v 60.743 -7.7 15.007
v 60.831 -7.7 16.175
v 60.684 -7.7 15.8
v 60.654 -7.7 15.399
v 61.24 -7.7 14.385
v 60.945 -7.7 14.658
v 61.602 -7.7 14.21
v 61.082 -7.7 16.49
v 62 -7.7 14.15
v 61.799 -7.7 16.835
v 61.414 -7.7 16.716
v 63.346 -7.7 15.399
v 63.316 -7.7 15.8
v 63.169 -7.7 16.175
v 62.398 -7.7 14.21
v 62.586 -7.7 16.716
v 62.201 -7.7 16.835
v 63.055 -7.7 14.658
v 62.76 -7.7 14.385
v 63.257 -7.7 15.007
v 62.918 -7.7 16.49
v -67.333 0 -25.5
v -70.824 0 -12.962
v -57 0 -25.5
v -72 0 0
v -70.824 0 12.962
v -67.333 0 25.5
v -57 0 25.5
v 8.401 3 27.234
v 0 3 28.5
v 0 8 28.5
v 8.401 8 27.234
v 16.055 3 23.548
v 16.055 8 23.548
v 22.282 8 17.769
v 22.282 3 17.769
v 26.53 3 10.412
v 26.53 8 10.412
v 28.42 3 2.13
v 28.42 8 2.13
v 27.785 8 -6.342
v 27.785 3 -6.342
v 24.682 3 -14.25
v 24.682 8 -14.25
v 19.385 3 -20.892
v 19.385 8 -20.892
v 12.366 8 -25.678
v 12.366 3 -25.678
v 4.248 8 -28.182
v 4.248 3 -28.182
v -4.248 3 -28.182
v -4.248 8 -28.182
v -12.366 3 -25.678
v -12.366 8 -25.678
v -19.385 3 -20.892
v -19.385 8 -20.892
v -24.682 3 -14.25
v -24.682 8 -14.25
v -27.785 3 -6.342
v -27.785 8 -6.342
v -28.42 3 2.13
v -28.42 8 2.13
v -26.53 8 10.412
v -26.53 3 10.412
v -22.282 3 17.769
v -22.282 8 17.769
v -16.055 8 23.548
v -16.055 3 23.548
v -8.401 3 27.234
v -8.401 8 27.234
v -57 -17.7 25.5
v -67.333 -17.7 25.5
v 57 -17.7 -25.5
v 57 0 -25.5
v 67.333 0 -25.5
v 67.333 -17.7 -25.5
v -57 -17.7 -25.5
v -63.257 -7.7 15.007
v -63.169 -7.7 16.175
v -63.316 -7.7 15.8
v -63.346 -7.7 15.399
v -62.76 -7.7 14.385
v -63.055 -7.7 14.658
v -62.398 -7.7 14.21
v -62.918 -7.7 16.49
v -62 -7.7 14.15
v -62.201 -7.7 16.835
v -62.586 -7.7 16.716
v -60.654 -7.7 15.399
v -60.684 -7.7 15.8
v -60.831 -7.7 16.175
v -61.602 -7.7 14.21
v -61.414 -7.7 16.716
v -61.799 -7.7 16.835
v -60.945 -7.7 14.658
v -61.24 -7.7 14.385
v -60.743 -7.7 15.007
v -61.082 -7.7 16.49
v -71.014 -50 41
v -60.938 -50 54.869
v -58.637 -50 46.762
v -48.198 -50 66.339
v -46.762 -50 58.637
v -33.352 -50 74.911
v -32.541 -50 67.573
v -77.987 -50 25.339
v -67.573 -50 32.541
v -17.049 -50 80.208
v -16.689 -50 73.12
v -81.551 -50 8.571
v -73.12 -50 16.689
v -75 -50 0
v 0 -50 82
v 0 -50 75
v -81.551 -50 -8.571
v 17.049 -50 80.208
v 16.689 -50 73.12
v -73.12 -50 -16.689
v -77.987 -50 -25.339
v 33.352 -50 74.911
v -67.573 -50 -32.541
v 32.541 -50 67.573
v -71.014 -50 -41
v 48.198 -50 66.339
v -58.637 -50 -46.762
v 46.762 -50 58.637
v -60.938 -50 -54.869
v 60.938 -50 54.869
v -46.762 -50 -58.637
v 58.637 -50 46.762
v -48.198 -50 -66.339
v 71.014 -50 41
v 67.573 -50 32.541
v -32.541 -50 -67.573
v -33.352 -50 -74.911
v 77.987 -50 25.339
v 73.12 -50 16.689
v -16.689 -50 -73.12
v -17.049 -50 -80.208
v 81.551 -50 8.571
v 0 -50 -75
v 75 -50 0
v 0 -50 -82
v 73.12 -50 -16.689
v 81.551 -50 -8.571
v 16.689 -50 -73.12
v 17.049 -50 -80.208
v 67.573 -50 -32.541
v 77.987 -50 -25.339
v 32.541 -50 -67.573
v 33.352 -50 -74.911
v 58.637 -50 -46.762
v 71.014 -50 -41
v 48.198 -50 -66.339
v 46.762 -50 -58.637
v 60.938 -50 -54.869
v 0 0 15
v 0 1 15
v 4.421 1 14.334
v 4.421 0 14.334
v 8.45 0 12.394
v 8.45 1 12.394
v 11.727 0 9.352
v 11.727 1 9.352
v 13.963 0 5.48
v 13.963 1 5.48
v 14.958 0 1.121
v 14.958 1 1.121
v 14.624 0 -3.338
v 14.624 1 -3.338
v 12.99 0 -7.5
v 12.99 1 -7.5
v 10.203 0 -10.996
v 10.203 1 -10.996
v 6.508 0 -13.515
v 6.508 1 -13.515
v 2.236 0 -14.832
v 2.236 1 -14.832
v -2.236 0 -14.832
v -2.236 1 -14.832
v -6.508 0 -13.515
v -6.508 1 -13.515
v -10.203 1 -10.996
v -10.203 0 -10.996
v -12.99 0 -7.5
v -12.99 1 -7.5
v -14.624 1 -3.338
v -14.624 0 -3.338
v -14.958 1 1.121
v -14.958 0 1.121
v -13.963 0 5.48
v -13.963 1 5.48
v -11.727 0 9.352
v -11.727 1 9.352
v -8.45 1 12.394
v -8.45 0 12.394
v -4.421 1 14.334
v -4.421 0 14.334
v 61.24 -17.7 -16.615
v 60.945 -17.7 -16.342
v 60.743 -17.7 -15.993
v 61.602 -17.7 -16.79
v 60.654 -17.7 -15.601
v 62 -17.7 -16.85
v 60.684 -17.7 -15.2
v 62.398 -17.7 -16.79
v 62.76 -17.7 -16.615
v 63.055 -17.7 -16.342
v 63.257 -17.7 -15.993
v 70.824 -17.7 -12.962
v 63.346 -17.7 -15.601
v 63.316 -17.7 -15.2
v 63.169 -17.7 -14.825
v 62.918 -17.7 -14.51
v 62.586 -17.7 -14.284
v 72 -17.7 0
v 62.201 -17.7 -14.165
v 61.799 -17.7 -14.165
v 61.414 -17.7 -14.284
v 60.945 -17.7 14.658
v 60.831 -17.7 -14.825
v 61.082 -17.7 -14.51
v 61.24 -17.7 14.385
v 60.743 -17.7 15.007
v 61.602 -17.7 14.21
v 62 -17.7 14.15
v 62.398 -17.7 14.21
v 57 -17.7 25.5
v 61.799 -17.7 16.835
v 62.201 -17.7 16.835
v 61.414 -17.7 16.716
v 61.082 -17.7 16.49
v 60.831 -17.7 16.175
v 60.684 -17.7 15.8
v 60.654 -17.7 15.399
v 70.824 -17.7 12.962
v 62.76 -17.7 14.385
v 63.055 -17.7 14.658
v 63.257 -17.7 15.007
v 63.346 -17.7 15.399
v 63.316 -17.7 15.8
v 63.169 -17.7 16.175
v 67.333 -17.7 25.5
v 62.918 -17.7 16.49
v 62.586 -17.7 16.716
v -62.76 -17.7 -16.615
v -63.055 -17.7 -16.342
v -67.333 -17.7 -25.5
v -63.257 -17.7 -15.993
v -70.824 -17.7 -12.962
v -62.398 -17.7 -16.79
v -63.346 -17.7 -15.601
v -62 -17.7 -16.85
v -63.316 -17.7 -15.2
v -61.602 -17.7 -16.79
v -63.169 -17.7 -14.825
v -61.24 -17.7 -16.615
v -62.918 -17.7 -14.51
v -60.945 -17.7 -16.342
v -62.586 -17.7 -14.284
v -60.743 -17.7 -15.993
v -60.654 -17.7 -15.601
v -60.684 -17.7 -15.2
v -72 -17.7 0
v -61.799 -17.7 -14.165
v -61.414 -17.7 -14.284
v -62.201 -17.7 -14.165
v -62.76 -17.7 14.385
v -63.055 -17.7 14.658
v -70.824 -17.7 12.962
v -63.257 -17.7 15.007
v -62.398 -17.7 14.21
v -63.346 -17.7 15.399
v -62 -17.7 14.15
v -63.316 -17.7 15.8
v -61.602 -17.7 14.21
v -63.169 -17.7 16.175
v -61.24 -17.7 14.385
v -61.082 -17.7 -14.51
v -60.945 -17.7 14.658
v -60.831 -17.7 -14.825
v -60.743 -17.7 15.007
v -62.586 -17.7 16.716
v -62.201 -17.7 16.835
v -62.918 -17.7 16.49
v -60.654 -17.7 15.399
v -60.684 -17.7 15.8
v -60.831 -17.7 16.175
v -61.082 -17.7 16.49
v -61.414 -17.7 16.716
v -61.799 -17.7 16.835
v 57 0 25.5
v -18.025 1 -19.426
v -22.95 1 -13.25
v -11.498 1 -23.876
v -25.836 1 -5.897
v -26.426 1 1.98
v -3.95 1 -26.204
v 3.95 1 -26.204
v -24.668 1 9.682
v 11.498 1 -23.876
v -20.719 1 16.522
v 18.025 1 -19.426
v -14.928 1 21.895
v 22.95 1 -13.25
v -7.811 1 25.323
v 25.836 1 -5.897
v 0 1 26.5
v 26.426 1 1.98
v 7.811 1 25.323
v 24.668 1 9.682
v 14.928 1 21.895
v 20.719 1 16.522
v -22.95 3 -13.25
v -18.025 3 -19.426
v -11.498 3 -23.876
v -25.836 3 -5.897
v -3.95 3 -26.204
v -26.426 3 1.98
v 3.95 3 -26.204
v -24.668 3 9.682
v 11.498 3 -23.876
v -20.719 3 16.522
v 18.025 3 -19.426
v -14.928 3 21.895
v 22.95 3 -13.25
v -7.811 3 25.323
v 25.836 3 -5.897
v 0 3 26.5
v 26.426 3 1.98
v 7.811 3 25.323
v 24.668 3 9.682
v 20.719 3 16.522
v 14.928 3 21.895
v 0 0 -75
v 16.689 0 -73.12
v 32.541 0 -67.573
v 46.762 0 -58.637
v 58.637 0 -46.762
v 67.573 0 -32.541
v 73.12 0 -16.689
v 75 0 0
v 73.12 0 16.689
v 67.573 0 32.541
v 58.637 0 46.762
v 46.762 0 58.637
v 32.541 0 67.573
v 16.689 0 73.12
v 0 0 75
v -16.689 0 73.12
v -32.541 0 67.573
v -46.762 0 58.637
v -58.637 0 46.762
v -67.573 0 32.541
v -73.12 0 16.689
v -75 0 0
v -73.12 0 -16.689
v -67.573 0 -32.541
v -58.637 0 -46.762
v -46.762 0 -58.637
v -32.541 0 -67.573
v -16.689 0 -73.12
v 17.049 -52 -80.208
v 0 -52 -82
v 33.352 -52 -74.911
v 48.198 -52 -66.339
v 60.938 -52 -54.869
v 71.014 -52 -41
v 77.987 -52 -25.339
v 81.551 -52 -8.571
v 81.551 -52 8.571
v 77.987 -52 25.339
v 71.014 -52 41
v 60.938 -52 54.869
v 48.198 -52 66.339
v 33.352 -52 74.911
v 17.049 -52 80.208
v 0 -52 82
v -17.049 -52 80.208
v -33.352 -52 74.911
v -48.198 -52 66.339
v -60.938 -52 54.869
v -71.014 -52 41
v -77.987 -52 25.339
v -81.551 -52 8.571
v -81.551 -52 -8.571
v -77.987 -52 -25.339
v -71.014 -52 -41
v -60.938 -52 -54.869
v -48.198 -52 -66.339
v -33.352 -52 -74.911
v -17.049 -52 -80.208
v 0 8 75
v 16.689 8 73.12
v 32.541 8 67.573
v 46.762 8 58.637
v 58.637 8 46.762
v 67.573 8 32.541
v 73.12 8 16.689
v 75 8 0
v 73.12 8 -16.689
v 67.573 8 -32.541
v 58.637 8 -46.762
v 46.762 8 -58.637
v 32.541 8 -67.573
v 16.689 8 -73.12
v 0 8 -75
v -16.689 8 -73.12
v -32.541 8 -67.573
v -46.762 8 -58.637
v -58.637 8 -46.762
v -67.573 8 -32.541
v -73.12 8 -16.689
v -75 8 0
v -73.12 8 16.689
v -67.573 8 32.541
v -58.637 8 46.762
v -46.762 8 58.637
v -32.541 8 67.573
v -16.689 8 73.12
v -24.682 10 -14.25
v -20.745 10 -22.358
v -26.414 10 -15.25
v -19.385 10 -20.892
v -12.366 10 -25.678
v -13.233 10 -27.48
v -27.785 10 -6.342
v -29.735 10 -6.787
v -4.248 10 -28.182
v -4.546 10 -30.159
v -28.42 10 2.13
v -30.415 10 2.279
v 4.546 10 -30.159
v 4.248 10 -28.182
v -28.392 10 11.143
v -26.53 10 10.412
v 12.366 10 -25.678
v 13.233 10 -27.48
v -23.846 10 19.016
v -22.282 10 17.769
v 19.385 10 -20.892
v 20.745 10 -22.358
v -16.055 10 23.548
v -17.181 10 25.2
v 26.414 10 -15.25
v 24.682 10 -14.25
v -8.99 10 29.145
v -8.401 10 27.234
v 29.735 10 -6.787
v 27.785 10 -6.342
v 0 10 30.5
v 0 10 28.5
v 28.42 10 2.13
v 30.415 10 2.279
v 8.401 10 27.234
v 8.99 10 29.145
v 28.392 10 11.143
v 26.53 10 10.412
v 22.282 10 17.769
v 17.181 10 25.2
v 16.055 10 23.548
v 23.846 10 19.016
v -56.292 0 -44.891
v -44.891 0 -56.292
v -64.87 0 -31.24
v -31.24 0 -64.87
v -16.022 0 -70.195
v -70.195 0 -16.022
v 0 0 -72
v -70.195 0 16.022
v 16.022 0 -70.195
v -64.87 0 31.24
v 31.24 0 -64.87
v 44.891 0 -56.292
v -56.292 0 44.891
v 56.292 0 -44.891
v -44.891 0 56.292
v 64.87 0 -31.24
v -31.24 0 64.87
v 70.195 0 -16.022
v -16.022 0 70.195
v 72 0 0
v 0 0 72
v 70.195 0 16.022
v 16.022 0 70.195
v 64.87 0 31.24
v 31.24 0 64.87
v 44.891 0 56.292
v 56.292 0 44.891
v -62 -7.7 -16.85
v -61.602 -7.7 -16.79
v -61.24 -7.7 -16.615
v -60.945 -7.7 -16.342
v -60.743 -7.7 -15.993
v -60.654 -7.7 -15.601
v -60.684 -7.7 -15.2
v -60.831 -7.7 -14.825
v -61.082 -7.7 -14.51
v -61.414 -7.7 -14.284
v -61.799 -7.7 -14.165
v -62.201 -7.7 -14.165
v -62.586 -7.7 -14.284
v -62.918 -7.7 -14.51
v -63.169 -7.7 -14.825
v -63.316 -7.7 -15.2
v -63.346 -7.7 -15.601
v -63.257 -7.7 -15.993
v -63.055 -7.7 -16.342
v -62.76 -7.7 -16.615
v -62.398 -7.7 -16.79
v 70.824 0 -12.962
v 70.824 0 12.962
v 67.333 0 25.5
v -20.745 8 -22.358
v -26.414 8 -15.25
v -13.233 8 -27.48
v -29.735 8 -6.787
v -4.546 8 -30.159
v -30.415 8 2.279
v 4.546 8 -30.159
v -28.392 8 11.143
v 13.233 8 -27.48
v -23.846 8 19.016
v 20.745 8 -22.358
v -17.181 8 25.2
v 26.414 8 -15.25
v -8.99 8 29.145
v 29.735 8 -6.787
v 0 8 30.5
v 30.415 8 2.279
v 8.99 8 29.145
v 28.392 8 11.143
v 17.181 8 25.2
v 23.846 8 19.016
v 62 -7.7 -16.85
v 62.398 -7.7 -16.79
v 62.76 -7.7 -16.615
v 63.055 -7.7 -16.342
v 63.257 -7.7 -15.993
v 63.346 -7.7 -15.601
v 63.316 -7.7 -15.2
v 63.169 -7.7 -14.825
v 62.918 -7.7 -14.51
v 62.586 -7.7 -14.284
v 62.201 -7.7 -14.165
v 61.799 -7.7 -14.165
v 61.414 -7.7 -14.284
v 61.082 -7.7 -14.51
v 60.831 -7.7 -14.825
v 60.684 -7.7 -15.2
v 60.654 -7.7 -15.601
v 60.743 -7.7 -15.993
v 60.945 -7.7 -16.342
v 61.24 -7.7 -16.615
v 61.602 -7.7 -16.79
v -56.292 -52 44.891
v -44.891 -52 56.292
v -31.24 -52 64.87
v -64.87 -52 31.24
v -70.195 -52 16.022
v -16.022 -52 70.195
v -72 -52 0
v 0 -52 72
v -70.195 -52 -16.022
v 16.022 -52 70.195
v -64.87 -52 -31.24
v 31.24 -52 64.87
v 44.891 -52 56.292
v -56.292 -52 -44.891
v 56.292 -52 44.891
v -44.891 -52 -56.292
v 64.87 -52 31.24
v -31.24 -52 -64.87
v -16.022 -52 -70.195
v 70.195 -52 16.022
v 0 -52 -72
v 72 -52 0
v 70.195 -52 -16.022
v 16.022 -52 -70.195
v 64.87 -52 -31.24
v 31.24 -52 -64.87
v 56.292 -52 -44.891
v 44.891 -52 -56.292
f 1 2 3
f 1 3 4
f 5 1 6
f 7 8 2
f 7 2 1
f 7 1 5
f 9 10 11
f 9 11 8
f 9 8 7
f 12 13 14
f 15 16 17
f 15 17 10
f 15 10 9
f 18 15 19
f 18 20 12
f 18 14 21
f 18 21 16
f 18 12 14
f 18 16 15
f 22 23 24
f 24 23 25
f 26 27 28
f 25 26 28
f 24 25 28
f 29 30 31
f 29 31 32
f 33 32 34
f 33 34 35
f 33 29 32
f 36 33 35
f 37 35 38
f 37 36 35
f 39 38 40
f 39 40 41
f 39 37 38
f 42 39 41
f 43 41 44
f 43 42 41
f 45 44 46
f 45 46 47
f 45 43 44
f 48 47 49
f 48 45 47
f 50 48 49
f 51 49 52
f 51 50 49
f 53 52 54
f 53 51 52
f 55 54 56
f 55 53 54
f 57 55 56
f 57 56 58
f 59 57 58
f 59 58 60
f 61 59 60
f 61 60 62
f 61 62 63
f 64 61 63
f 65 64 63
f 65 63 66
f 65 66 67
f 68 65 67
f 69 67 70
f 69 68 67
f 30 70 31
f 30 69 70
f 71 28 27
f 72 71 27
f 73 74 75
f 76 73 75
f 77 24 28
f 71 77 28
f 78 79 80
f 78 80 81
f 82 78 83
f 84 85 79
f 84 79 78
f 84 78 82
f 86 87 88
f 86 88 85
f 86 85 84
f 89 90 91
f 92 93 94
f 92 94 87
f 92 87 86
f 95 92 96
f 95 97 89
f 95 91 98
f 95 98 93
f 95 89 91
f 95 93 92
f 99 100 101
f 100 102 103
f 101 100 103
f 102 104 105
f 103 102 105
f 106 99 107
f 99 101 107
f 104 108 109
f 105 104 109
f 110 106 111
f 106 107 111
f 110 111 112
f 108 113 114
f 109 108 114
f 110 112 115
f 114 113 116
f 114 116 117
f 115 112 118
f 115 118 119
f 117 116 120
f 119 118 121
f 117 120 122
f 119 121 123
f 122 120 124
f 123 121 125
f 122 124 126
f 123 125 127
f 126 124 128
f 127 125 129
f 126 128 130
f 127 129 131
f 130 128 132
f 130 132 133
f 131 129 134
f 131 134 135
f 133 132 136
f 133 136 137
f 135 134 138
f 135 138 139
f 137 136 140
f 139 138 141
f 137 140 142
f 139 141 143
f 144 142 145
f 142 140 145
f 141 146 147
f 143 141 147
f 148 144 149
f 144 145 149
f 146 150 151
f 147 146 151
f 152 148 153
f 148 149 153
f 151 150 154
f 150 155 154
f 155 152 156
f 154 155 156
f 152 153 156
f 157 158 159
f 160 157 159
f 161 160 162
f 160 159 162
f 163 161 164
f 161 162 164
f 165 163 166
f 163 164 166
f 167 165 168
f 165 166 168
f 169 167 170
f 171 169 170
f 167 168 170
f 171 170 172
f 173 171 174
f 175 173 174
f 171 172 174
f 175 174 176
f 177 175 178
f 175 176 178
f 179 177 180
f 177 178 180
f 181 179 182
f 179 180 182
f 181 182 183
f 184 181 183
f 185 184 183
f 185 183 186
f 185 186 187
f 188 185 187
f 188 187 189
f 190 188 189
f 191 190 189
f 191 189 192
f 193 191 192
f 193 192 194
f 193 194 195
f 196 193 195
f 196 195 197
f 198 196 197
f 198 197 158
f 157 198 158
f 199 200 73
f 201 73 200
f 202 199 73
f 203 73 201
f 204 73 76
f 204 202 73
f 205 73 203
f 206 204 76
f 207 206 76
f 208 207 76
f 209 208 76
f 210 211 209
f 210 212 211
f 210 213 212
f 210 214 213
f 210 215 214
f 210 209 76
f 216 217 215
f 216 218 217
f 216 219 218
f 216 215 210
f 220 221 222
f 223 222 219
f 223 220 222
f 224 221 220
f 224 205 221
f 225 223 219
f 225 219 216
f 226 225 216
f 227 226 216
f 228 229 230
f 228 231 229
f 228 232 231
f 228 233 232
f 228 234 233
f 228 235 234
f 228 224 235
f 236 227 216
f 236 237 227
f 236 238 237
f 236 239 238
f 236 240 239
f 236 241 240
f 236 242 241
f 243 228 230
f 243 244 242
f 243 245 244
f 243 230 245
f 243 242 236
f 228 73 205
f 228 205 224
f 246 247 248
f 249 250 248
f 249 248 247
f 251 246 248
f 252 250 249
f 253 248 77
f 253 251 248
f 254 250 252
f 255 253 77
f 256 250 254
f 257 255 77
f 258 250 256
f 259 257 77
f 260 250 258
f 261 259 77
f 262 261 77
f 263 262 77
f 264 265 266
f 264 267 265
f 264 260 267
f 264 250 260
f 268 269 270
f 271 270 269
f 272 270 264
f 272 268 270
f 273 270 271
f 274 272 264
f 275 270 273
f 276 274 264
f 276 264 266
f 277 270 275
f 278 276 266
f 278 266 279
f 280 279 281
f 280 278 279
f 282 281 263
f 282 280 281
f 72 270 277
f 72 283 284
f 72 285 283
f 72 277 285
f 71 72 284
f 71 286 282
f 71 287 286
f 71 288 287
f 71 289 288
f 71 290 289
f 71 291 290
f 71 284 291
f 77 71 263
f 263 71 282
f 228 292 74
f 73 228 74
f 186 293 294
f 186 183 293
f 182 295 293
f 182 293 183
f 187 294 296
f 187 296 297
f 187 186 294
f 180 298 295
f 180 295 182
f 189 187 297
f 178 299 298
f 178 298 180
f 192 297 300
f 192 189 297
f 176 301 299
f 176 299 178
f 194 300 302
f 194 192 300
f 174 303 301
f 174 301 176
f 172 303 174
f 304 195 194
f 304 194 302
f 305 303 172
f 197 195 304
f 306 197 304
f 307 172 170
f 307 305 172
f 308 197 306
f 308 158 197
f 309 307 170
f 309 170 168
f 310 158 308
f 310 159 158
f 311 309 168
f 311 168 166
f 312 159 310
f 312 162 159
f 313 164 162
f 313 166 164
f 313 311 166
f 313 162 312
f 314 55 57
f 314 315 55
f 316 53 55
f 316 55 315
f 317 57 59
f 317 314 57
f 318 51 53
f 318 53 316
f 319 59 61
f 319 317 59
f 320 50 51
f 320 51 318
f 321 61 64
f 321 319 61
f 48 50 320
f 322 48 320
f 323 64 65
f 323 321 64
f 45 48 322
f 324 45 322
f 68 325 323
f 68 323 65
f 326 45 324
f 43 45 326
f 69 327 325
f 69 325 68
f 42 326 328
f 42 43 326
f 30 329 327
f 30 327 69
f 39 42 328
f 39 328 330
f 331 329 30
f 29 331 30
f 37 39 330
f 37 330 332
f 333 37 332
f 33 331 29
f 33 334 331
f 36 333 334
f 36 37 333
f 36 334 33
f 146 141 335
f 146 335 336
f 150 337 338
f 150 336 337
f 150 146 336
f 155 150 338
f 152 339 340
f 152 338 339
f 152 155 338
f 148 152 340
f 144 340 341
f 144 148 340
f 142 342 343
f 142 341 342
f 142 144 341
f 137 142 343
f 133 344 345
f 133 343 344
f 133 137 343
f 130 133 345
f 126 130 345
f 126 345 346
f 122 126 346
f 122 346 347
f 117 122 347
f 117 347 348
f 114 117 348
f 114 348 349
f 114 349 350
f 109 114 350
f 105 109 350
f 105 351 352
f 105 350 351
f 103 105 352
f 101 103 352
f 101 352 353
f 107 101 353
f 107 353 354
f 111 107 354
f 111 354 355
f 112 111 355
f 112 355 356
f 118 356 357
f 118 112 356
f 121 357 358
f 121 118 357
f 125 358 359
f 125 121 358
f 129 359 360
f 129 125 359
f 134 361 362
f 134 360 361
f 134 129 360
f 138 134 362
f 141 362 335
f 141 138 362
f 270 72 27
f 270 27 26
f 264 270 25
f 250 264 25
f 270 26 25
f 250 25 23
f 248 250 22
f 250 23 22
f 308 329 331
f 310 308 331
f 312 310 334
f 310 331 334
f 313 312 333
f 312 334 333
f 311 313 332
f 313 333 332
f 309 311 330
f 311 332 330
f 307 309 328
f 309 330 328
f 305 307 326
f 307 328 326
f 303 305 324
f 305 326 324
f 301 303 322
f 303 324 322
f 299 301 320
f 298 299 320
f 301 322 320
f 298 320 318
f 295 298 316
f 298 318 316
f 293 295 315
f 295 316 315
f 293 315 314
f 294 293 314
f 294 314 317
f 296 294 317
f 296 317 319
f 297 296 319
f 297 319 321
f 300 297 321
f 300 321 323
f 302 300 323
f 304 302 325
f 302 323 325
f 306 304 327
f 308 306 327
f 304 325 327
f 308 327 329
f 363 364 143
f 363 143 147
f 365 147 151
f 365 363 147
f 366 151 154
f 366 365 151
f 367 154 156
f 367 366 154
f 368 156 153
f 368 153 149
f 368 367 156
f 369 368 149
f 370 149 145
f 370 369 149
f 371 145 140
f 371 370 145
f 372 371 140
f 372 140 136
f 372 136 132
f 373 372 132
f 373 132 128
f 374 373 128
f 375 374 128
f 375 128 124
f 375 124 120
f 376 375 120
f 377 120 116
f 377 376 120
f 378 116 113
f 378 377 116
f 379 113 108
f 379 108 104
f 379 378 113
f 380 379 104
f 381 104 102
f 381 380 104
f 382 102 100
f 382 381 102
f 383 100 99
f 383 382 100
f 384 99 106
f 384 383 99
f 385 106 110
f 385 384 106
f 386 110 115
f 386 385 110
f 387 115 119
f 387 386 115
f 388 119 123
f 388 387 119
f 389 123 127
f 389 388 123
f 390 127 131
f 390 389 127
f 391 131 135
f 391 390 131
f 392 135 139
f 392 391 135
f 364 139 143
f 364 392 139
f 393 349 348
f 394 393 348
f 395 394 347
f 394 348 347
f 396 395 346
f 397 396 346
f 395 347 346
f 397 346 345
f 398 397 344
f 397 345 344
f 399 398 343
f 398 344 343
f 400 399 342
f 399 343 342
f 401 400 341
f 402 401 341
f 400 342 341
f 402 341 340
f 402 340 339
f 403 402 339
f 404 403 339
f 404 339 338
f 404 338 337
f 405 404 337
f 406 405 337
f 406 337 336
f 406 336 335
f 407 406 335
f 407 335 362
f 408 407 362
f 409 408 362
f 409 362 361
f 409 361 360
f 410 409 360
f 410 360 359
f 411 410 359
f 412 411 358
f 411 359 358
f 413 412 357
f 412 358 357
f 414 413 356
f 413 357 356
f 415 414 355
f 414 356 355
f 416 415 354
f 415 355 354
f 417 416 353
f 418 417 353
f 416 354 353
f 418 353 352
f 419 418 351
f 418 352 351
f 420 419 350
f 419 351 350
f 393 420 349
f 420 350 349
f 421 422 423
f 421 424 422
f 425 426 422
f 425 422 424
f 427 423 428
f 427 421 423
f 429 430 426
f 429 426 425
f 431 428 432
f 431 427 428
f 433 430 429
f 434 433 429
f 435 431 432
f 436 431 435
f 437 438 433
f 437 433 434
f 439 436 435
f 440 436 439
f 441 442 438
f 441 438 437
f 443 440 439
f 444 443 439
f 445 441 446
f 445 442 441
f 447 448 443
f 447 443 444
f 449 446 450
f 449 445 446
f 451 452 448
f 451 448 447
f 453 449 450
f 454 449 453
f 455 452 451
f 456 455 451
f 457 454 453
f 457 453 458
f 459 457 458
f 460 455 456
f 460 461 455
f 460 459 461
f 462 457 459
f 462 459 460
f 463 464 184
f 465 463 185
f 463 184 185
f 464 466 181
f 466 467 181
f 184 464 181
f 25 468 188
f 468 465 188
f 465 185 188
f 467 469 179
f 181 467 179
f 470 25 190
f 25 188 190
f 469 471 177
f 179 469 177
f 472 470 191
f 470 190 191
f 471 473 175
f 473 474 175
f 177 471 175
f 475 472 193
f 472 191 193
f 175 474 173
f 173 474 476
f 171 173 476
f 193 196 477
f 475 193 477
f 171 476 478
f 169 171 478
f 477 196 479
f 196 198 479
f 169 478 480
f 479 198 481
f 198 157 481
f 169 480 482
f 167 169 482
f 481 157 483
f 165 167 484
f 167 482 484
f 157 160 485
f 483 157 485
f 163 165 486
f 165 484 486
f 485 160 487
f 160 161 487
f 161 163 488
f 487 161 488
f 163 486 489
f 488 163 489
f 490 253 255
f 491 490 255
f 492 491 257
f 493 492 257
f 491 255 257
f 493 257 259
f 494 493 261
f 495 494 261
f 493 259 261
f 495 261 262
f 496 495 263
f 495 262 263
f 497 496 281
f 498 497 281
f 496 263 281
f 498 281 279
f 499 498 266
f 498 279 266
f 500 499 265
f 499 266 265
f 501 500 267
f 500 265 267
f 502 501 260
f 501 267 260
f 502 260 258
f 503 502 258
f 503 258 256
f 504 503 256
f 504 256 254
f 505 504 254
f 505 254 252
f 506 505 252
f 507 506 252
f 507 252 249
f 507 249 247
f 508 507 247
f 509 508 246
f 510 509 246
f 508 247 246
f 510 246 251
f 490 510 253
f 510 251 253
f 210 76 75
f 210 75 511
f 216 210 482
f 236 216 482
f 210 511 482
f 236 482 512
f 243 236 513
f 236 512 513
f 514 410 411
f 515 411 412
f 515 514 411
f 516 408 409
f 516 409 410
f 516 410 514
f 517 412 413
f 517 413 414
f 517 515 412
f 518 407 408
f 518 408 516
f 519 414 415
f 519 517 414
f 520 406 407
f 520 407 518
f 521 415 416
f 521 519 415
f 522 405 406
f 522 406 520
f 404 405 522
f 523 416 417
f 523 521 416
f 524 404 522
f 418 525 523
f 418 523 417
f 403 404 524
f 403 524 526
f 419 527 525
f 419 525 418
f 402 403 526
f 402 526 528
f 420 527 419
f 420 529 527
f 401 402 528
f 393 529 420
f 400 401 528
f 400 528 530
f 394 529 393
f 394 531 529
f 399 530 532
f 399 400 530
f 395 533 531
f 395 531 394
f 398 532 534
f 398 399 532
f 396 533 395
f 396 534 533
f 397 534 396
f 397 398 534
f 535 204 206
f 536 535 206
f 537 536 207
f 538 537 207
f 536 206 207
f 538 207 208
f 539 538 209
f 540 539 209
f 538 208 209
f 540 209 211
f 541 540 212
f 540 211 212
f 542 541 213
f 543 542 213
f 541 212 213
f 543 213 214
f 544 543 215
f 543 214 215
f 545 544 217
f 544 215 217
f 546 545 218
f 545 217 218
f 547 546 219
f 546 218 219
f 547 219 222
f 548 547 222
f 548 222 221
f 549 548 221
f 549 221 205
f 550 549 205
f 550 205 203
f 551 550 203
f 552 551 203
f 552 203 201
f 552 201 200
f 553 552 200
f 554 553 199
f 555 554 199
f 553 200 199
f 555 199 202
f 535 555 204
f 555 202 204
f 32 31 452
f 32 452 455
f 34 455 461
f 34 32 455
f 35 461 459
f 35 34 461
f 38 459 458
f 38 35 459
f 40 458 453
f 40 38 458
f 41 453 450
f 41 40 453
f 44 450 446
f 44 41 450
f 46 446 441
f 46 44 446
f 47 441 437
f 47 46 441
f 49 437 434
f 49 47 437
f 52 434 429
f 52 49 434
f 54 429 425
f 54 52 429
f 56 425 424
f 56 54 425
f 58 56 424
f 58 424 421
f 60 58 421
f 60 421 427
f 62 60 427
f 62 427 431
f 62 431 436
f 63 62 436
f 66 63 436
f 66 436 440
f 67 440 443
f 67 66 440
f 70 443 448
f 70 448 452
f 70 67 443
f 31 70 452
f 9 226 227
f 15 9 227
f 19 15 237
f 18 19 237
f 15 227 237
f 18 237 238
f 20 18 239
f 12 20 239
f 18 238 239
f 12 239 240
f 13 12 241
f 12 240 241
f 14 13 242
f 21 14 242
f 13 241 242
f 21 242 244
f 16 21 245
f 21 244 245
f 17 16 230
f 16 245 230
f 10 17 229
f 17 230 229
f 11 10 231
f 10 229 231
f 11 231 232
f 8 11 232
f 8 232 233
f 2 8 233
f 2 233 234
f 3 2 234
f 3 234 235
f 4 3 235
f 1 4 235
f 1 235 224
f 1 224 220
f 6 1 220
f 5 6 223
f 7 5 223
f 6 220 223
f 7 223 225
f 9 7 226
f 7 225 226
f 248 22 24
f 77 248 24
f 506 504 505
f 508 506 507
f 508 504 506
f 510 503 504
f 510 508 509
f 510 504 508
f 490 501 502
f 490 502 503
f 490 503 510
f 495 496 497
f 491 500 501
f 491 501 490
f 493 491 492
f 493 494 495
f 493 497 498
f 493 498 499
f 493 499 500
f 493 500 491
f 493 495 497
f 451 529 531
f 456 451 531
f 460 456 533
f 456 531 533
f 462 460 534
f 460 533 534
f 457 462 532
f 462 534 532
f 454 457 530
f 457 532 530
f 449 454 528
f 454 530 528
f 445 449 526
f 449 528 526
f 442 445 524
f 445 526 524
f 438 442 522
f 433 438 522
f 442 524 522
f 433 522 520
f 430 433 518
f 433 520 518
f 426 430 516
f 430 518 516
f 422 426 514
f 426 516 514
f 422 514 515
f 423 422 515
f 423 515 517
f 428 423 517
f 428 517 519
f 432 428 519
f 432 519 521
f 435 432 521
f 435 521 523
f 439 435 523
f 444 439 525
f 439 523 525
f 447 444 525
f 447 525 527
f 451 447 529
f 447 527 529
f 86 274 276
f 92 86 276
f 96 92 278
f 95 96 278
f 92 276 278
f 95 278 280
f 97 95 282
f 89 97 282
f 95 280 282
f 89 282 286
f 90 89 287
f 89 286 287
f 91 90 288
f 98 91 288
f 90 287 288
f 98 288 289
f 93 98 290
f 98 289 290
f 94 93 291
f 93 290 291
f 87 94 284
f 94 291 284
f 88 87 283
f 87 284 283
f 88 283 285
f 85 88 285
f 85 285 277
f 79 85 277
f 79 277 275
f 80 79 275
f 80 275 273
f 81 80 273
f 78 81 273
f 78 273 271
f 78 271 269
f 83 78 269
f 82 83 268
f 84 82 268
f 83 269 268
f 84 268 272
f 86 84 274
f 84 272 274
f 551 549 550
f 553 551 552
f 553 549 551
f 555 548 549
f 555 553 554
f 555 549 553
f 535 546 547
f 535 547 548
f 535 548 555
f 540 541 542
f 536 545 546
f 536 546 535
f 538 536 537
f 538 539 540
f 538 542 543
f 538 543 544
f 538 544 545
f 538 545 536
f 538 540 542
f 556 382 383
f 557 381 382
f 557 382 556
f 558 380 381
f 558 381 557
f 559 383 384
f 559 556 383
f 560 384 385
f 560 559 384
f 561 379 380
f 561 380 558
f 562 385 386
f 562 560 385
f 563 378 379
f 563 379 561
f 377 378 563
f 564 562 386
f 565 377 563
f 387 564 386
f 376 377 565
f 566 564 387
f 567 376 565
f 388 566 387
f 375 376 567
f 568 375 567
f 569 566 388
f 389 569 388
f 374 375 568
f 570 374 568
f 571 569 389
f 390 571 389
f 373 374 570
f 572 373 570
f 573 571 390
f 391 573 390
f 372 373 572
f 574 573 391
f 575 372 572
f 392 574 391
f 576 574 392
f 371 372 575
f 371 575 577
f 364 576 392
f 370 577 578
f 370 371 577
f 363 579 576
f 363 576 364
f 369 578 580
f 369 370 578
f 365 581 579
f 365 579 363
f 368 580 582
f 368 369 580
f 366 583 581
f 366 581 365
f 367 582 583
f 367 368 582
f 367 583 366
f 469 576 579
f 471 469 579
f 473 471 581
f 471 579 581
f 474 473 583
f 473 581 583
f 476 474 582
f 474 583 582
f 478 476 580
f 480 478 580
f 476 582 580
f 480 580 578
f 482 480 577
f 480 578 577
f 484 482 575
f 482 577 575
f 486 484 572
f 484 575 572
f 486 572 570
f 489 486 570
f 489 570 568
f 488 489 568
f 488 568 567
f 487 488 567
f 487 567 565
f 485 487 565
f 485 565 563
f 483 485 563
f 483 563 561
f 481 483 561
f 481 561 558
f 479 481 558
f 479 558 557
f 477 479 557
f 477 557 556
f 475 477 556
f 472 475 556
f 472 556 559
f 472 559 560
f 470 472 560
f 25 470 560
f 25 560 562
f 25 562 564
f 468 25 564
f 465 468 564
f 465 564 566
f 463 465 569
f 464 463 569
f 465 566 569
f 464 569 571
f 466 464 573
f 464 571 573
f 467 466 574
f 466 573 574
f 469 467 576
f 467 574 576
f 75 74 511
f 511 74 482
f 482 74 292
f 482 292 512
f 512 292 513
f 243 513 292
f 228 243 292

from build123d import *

# Parameters (mm, degrees)
SKETCH_1_R          = 75
EXTRUDE_1_DEPTH     = 8
EXTRUDE_START       = 50
SKETCH_2_R          = 75
SKETCH_2_R_2        = 72
EXTRUDE_2_DEPTH     = 50
EXTRUDE_START_2     = 2
SKETCH_3_R          = 82
SKETCH_3_R_2        = 72
EXTRUDE_3_DEPTH     = 2
SKETCH_4_R          = 30.5
SKETCH_4_R_2        = 28.5
EXTRUDE_4_DEPTH     = 2
CUT_EXTRUDE_START   = -5
SKETCH_5_R          = 28.5
CUT_EXTRUDE_1_DEPTH = 5
SKETCH_6_R          = 26.5
CUT_EXTRUDE_2_DEPTH = 2
CUT_EXTRUDE_3_REACH = 129.503
SKETCH_7_R          = 15
EXTRUDE_6_DEPTH     = 17.7
SKETCH_10_R         = 1.35
CUT_EXTRUDE_4_DEPTH = 10


# Read off the part's stored shape, not the designer's step: 보스-돌출6
with BuildPart() as part:
    # 스케치1 → 보스-돌출1 (new body)
    with BuildSketch(Plane(origin=(0, 0, 0), x_dir=(1, 0, 0), z_dir=(0, 1, 0))):
        with Locations(Location((0, 0, 0), (0, 0, 270))):
            Circle(SKETCH_1_R)
    extrude(amount=EXTRUDE_1_DEPTH)

    # 스케치2 → 보스-돌출2 (add)
    with BuildSketch(Plane.XZ.offset(EXTRUDE_START)):
        with Locations(Location((0, 0, 0), (0, 0, 270))):
            Circle(SKETCH_2_R)
        with Locations(Location((0, 0, 0), (0, 0, 270))):
            Circle(SKETCH_2_R_2, mode=Mode.SUBTRACT)
    extrude(amount=-EXTRUDE_2_DEPTH)

    # 스케치3 → 보스-돌출3 (add)
    with BuildSketch(Plane.XZ.offset(50).offset(EXTRUDE_START_2)):
        with Locations(Location((0, 0, 0), (0, 0, 270))):
            Circle(SKETCH_3_R)
        with Locations(Location((0, 0, 0), (0, 0, 270))):
            Circle(SKETCH_3_R_2, mode=Mode.SUBTRACT)
    extrude(amount=-EXTRUDE_3_DEPTH)

    # 스케치4 → 보스-돌출4 (add)
    with BuildSketch(Plane(origin=(0, 8, 0), x_dir=(1, 0, 0), z_dir=(0, 1, 0))):
        with Locations(Location((0, 0, 0), (0, 0, 270))):
            Circle(SKETCH_4_R)
        with Locations(Location((0, 0, 0), (0, 0, 270))):
            Circle(SKETCH_4_R_2, mode=Mode.SUBTRACT)
    extrude(amount=EXTRUDE_4_DEPTH)

    # 스케치5 → 컷-돌출1 (cut)
    with BuildSketch(Plane(origin=(0, 8, 0), x_dir=(1, 0, 0), z_dir=(0, 1, 0)).offset(CUT_EXTRUDE_START)):
        with Locations(Location((0, 0, 0), (0, 0, 270))):
            Circle(SKETCH_5_R)
    extrude(amount=CUT_EXTRUDE_1_DEPTH, mode=Mode.SUBTRACT)

    # 스케치6 → 컷-돌출2 (cut)
    with BuildSketch(Plane(origin=(0, 3, 0), x_dir=(1, 0, 0), z_dir=(0, 1, 0))):
        with Locations(Location((0, 0, 0), (0, 0, 270))):
            Circle(SKETCH_6_R)
    extrude(amount=-CUT_EXTRUDE_2_DEPTH, mode=Mode.SUBTRACT)

    # 스케치7 → 컷-돌출3 (cut, up to next)
    with BuildSketch(Plane(origin=(0, 1, 0), x_dir=(1, 0, 0), z_dir=(0, 1, 0)), mode=Mode.PRIVATE) as cut_extrude_3_sk1:
        with Locations(Location((0, 0, 0), (0, 0, 270))):
            Circle(SKETCH_7_R)
    cut_extrude_3_tool1 = extrude(cut_extrude_3_sk1.sketch, amount=-CUT_EXTRUDE_3_REACH, mode=Mode.PRIVATE) & part.part
    add(cut_extrude_3_tool1.solids().sort_by_distance((0, 1, 0))[0], mode=Mode.SUBTRACT)


with BuildPart() as body_2:
    # 보스-돌출6 outline → 보스-돌출6 (new body)
    with BuildSketch(Plane.XZ):
        with BuildLine():
            Line((57, 25.5), (57, -25.5))
            Line((57, -25.5), (67.333127062, -25.5))
            ThreePointArc((67.333127062, -25.5), (72, 0), (67.333127062, 25.5))
            Line((67.333127062, 25.5), (57, 25.5))
        make_face()
        with BuildLine():
            Line((-67.333127062, -25.5), (-57, -25.5))
            Line((-57, -25.5), (-57, 25.5))
            Line((-57, 25.5), (-67.333127062, 25.5))
            ThreePointArc((-67.333127062, 25.5), (-72, 0), (-67.333127062, -25.5))
        make_face()
    extrude(amount=EXTRUDE_6_DEPTH)

    # 스케치10 → 컷-돌출4 (cut)
    with BuildSketch(Plane.XZ.offset(17.7)):
        with Locations(Location((-62, 15.5, 0), (0, 0, 270))):
            Circle(SKETCH_10_R)
        with Locations(Location((-62, -15.5, 0), (0, 0, 270))):
            Circle(SKETCH_10_R)
        with Locations(Location((62, 15.5, 0), (0, 0, 270))):
            Circle(SKETCH_10_R)
        with Locations(Location((62, -15.5, 0), (0, 0, 270))):
            Circle(SKETCH_10_R)
    extrude(amount=-CUT_EXTRUDE_4_DEPTH, mode=Mode.SUBTRACT)


solid = Compound([part.part, body_2.part])
